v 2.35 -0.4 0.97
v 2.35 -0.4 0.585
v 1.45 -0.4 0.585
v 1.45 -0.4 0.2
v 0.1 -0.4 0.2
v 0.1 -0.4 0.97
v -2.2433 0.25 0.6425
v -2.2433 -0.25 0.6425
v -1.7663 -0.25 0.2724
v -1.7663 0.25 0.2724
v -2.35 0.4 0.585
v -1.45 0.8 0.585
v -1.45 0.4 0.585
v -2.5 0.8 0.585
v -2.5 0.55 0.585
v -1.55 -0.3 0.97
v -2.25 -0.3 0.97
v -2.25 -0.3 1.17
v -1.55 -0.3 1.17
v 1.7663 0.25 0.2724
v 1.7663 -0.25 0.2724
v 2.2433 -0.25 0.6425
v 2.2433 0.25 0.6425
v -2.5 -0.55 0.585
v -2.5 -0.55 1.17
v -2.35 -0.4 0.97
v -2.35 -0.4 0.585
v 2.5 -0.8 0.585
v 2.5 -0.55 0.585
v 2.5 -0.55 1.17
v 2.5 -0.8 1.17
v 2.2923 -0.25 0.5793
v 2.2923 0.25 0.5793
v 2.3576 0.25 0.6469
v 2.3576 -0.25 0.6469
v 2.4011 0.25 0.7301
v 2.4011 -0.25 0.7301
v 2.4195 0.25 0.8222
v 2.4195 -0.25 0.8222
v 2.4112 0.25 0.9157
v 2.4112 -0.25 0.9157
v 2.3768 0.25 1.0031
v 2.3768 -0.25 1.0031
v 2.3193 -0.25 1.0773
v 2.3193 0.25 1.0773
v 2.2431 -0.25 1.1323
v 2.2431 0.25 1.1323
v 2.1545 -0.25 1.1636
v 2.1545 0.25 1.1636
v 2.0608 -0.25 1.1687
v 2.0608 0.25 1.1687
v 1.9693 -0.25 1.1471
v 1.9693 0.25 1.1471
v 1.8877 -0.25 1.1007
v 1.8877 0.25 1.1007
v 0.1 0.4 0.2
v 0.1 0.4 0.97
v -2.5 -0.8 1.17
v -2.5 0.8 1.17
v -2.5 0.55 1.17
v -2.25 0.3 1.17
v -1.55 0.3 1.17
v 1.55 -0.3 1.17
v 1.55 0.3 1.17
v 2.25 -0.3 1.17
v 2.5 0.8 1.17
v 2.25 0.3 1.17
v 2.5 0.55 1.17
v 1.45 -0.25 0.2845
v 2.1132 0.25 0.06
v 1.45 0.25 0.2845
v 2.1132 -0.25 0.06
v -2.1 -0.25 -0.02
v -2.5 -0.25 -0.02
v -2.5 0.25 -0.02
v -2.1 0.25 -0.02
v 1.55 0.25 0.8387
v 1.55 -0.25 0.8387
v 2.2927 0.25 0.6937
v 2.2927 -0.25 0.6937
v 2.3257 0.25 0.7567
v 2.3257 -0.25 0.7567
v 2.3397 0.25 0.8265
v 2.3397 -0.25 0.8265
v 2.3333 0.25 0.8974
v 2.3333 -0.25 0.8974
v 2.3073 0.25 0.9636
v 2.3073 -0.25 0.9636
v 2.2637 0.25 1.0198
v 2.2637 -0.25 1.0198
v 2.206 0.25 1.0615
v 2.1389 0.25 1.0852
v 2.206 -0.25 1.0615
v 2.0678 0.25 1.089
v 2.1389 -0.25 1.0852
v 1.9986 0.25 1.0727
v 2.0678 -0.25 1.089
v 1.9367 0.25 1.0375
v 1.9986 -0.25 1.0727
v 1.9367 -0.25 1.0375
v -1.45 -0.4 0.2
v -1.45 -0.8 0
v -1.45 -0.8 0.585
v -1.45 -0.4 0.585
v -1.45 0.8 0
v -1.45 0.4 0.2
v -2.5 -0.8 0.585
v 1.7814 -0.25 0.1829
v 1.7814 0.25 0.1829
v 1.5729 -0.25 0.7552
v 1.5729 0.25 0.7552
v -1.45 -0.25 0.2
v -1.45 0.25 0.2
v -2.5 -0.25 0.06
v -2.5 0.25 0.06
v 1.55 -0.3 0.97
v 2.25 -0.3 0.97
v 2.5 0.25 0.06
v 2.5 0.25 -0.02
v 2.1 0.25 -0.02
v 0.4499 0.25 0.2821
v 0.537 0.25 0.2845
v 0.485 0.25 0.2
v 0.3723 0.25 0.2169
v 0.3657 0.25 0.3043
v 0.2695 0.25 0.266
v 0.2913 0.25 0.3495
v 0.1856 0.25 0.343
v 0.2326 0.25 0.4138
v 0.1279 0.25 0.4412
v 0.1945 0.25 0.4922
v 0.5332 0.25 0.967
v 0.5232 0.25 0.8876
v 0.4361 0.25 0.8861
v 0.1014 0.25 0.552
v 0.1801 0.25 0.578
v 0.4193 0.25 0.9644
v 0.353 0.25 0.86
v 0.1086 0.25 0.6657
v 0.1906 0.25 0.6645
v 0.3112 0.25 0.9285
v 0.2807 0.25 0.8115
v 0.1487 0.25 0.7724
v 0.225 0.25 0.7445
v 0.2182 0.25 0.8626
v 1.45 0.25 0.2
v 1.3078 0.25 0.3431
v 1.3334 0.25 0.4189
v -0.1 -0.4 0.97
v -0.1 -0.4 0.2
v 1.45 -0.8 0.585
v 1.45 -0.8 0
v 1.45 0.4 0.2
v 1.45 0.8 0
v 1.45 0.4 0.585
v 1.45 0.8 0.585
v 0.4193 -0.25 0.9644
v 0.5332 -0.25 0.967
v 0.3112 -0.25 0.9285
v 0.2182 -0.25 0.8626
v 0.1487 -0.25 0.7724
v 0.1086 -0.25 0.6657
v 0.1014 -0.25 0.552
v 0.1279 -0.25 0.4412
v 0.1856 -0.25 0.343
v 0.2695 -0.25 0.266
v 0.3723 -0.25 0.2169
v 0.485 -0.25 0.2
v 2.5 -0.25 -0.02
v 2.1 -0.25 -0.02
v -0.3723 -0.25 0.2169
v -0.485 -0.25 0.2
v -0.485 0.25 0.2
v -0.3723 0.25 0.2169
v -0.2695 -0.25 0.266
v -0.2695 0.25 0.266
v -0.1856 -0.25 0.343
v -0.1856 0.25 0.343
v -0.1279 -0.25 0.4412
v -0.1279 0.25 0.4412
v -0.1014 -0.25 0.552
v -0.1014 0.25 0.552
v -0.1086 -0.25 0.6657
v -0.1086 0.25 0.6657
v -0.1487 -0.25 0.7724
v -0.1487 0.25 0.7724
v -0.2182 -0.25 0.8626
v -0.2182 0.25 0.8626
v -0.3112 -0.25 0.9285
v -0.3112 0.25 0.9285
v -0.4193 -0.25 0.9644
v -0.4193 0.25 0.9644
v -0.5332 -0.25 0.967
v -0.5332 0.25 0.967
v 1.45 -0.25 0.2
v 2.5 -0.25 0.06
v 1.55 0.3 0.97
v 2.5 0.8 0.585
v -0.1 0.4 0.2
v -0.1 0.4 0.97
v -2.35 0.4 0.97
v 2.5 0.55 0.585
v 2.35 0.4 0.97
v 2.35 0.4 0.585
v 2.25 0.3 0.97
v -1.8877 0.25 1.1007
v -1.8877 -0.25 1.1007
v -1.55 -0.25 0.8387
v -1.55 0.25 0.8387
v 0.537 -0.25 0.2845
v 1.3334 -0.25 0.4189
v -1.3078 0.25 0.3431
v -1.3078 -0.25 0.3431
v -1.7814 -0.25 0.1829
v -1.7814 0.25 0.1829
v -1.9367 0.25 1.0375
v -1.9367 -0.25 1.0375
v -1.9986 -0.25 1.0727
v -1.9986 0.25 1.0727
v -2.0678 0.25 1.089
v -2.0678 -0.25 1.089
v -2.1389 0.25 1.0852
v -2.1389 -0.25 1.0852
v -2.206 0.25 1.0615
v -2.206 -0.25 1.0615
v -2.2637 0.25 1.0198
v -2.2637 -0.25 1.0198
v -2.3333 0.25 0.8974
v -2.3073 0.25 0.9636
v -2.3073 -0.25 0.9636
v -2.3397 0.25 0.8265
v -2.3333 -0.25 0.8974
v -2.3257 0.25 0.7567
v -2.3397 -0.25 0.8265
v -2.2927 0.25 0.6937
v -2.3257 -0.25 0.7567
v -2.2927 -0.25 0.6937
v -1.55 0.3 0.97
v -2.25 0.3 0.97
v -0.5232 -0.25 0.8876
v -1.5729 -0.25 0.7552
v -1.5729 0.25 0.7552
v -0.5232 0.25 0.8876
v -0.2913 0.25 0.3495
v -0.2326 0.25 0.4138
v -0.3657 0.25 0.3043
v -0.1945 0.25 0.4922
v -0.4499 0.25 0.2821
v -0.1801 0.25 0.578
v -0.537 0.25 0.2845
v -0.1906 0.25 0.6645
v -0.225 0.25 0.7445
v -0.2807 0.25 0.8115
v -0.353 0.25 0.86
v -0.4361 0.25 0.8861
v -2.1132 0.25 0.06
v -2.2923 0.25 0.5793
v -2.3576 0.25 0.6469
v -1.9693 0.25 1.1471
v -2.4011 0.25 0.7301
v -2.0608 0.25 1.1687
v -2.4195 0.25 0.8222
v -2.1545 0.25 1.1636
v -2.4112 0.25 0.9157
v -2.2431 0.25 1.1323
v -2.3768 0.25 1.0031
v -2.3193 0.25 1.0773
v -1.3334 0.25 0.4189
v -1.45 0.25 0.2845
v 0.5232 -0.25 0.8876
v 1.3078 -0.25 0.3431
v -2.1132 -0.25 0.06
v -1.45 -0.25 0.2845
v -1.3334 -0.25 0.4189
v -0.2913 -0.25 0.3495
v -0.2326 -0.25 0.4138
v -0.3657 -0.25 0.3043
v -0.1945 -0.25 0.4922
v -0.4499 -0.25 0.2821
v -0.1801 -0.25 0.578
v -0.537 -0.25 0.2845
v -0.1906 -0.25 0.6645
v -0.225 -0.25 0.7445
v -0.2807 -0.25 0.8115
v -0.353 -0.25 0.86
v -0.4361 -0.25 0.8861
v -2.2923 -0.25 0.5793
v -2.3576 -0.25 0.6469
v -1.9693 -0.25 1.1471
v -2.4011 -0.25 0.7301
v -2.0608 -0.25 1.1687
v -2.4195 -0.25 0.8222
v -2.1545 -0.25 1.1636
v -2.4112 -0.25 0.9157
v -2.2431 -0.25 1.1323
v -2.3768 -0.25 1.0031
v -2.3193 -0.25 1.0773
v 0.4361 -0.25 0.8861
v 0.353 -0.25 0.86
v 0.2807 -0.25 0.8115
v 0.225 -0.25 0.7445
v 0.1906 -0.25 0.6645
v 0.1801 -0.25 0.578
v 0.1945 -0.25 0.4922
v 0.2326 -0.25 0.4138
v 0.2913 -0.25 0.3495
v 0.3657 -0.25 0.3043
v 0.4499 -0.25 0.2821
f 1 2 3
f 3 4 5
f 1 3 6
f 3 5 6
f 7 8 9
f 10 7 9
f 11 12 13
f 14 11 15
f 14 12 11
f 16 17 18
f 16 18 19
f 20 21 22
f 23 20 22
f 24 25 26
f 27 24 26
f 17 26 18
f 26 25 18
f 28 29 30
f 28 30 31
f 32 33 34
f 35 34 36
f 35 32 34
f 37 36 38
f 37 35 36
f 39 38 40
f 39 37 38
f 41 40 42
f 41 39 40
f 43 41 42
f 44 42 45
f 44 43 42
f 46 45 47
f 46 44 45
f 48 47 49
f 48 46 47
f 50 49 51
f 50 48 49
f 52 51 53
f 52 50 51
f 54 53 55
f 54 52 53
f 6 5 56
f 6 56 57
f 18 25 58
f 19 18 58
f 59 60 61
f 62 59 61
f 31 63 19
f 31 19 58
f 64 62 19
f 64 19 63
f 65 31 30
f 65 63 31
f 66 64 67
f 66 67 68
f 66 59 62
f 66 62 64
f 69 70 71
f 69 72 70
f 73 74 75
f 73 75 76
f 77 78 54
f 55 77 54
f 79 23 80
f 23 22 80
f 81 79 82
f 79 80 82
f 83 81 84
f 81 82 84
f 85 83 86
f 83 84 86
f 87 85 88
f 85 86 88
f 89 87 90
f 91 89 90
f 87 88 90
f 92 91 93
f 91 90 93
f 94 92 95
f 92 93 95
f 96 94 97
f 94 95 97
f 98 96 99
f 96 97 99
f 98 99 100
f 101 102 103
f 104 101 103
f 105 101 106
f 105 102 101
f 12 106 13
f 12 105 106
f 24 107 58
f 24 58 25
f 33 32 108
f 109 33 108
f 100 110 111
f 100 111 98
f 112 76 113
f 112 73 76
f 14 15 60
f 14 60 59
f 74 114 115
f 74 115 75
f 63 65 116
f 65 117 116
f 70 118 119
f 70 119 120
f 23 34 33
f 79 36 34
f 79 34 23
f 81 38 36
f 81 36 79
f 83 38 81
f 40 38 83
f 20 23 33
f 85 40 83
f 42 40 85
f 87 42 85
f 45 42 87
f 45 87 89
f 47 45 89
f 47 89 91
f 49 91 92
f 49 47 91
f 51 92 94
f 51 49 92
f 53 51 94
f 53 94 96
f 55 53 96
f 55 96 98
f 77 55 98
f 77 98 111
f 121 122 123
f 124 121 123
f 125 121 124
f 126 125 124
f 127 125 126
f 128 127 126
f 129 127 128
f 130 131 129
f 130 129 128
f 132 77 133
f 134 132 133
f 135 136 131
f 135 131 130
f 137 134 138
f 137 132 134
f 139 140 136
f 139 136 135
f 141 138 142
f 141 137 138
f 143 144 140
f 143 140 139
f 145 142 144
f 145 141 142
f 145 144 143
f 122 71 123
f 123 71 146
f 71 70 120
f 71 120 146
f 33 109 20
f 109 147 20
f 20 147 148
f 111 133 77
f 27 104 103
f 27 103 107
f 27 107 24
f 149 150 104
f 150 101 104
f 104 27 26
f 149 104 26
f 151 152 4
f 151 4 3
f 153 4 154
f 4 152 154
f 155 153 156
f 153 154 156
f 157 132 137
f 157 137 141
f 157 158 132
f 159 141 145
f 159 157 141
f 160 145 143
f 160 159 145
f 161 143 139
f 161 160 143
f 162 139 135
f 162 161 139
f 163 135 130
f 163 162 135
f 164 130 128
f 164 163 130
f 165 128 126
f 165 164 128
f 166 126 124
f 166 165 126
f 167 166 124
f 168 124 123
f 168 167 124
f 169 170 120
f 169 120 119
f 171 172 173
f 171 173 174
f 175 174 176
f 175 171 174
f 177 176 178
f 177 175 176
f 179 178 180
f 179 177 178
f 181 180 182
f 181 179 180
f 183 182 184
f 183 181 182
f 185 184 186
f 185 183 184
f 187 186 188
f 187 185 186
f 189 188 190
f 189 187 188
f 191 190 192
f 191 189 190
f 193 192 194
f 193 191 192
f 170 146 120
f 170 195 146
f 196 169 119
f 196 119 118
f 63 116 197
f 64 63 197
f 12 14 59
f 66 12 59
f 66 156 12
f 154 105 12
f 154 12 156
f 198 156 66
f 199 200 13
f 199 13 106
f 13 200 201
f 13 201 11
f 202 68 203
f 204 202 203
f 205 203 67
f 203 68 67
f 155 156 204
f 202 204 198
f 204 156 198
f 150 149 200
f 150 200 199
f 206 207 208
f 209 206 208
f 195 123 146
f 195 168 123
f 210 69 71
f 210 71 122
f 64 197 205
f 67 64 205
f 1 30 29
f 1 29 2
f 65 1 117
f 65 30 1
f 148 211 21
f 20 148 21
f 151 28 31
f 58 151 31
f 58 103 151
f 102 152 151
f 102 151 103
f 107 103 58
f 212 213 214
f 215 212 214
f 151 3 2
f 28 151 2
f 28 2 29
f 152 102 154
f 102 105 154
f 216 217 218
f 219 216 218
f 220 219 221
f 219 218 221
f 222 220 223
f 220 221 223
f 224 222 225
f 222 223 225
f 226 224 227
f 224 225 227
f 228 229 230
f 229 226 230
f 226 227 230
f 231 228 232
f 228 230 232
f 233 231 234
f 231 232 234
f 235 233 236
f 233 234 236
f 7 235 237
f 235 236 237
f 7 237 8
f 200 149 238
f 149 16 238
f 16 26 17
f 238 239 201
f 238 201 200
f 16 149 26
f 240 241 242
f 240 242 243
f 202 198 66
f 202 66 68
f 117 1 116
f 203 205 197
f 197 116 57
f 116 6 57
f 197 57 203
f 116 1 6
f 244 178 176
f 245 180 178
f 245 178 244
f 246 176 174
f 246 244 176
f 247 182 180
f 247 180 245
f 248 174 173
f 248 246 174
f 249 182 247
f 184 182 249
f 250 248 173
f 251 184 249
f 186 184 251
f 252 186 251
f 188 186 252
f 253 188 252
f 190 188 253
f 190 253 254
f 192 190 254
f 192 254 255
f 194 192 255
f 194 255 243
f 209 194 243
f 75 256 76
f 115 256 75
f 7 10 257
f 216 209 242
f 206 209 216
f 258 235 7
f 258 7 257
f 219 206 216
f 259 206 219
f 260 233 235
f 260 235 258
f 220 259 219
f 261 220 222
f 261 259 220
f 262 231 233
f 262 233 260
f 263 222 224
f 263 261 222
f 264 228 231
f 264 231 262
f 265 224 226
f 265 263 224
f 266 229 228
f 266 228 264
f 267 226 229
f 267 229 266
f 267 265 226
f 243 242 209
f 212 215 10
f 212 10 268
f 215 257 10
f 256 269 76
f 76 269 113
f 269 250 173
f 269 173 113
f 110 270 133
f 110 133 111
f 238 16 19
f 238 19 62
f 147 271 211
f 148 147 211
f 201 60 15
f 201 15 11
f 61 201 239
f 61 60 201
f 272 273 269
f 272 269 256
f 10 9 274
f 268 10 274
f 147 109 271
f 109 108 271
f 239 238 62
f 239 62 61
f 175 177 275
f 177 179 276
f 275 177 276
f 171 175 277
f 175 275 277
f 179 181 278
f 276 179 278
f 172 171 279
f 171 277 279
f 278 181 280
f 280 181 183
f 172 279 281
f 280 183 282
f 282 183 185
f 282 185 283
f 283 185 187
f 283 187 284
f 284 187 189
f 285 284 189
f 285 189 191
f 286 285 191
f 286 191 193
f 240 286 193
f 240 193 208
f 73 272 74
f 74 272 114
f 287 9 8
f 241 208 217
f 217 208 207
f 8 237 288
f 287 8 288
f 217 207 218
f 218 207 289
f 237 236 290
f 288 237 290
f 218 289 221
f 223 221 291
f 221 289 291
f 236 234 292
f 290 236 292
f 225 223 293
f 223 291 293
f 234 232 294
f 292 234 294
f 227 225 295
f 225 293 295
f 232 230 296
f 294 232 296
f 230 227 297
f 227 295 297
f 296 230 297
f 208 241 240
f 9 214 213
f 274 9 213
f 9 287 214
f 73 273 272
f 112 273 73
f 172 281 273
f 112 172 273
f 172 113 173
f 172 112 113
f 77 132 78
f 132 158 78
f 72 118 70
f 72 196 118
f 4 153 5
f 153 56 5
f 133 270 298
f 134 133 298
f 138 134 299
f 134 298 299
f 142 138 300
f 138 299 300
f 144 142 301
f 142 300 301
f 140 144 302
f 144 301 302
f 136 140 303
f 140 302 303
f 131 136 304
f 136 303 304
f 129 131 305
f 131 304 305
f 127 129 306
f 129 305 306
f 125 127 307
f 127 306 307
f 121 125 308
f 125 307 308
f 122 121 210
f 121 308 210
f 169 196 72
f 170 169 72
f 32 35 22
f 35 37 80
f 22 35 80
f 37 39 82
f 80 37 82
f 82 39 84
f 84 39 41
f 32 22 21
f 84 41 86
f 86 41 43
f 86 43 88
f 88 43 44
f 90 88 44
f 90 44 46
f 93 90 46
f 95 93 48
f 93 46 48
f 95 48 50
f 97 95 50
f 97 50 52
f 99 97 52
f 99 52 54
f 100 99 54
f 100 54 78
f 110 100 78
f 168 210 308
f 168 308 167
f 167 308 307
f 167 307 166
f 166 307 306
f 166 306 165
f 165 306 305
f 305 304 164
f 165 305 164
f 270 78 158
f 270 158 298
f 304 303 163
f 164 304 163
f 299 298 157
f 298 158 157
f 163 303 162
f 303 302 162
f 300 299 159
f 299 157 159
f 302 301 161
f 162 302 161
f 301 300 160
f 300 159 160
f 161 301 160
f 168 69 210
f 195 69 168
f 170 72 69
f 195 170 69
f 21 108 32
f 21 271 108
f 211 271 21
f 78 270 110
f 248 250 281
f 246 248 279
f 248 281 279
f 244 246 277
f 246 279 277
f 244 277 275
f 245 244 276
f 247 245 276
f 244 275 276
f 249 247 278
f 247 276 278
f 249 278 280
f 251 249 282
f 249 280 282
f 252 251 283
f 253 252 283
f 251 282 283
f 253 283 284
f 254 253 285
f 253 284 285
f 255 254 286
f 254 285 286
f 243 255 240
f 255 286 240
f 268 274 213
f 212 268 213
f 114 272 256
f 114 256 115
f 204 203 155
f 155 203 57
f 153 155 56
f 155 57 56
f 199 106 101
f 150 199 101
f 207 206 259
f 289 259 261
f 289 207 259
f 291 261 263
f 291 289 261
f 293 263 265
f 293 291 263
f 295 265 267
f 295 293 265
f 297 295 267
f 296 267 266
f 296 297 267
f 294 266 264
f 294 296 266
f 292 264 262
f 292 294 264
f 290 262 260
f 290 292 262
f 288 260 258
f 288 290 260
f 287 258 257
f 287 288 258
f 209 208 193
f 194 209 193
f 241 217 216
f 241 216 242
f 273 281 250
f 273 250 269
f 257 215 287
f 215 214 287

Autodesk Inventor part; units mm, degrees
ref_plane "YZ Plane" through (0, 0, 0) normal (1, 0, 0) x (0, 1, 0)
ref_plane "XZ Plane" through (0, 0, 0) normal (0, 1, 0) x (-1, 0, 0)
ref_plane "XY Plane" through (0, 0, 0) normal (0, 0, 1) x (1, 0, 0)
sketch "Sketch1" plane through (0, 0, 0) normal (0, 0, 1) x (1, 0, 0)
  line L0 (2.5, -0.8) -> (-2.5, -0.8)
  line L1 (-2.5, -0.8) -> (-2.5, 0.8)
  line L2 (-2.5, 0.8) -> (2.5, 0.8)
  line L3 (2.5, 0.8) -> (2.5, -0.8)
  line L4 (2.5, -0.8) -> (-2.5, 0.8) construction
  line L5 (-2.5, -0.8) -> (2.5, 0.8) construction
  line L6 (-2.5, -0.3) -> (-1.55, -0.3)
  line L7 (-1.55, -0.3) -> (-1.55, 0.3)
  line L8 (-1.55, 0.3) -> (-2.5, 0.3)
  line L9 (-2.5, 0.3) -> (-2.5, -0.3)
  line L10 (0, -0.8) -> (0, 0.8)
  line L11 (2.5, -0.3) -> (1.55, -0.3)
  line L12 (1.55, -0.3) -> (1.55, 0.3)
  line L13 (1.55, 0.3) -> (2.5, 0.3)
  line L14 (2.5, 0.3) -> (2.5, -0.3)
  point P0 (0, 0)
  point P1 (-2.5, 0)
  point P2 (2.5, 0)
  dimension "d0" = 5
  dimension "d1" = 1.6
  dimension "d2" = 0.95
  dimension "d3" = 0.6
extrude "Extrusion1" add sketch "Sketch1" along normal blind 1.17 contours L0 L10 L2 L3 L13 L12 L11 | L0 L1 L6 L7 L8 L2 L10
sketch "Sketch2" plane through (-2.5, 0.8, 0) normal (0, 1, 0) x (1, 0, 0)
  line L0 (5, 0) -> (0, 0) projected
  line L1 (0, 0) -> (0, -1.17) projected
  line L2 (5, -1.17) -> (0, -1.17) projected
  line L3 (5, 0) -> (5, -1.17) projected
  line L4 (5, 0) -> (3.95, 0)
  line L5 (3.95, 0) -> (3.95, -0.585)
  line L6 (3.95, -0.585) -> (5, -0.585)
  line L7 (5, -0.585) -> (5, 0)
  line L8 (2.5, 0) -> (2.5, -1.17)
  line L9 (0, 0) -> (1.05, 0)
  line L10 (1.05, 0) -> (1.05, -0.585)
  line L11 (1.05, -0.585) -> (0, -0.585)
  line L12 (0, -0.585) -> (0, 0)
  dimension "d6" = 0.585
  dimension "d7" = 2.9
extrude "Extrusion2" cut sketch "Sketch2" against normal through all contours L3 L6 L5 L0 | L10 L11 L1 L0
sketch "Sketch3" plane through (1.45, 0.8, 0.585) normal (1, 0, 0) x (0, 0, -1)
  line L0 (0.585, -1.6) -> (0, -1.6) projected
  line L1 (0.585, 0) -> (0.585, -1.6) projected
  line L2 (0, 0) -> (0.585, 0) projected
  line L3 (0, 0) -> (0, -1.6) projected
  line L4 (0, -1.6) -> (0, -1.1) projected
  line L5 (0, -1.1) -> (-0.585, -1.1) projected
  line L6 (-0.585, -1.6) -> (-0.585, -1.1) projected
  line L7 (0, -1.6) -> (-0.585, -1.6) projected
  line L8 (0, -1.1) -> (0, -0.5) projected
  line L9 (0, -0.5) -> (-0.585, -0.5) projected
  line L10 (-0.585, -1.1) -> (-0.585, -0.5) projected
  line L11 (0, -1.1) -> (-0.585, -1.1) projected
  line L12 (0, -0.5) -> (0, 0) projected
  line L13 (0, 0) -> (-0.585, 0) projected
  line L14 (-0.585, -0.5) -> (-0.585, 0) projected
  line L15 (-0.585, -0.5) -> (0, -0.5) projected
  line L16 (0.385, -1.2) -> (-0.385, -1.2)
  line L17 (-0.385, -1.2) -> (-0.385, -0.4)
  line L18 (-0.385, -0.4) -> (0.385, -0.4)
  line L19 (0.385, -0.4) -> (0.385, -1.2)
  point P0 (0.585, -0.8)
  dimension "d10" = 0.4
  dimension "d11" = 0.4
  dimension "d12" = 0.2
  dimension "d13" = 0.2
extrude "Extrusion3" cut sketch "Sketch3" along normal through all both and the other way through all contours L16 L17 L5 L3 | L3 L18 L19 L16 | L5 L17 L9 L3 | L3 L9 L17 L18
sketch "Sketch4" plane through (0, 0, 0) normal (0, 1, 0) x (-1, 0, 0)
  line L0 (2.5, 0.97) -> (2.5, 0.585) projected
  line L1 (-2.5, 0.97) -> (2.5, 0.97) projected
  line L2 (-2.5, 0.585) -> (-2.5, 0.97) projected
  line L3 (-1.45, 0.585) -> (-2.5, 0.585) projected
  line L4 (-1.45, 0.2) -> (-1.45, 0.585) projected
  line L5 (1.45, 0.2) -> (-1.45, 0.2) projected
  line L6 (1.45, 0.585) -> (1.45, 0.2) projected
  line L7 (2.5, 0.585) -> (1.45, 0.585) projected
  line L8 (-0.1, 0.97) -> (0.1, 0.97)
  line L9 (0.1, 0.97) -> (0.1, 0.2)
  line L10 (0.1, 0.2) -> (-0.1, 0.2)
  line L11 (-0.1, 0.2) -> (-0.1, 0.97)
  point P0 (0, 0)
  point P1 (0, 0.97)
  dimension "d16" = 0.2
extrude "Extrusion4" add sketch "Sketch4" along normal mid plane 1.6 contours L9 L5 L11 L1
sketch "Sketch5" plane through (0, 0, 0) normal (0, 1, 0) x (-1, 0, 0)
  line L0 (-0.1, 0.2) -> (-0.1, 0.97) projected
  line L1 (-2.5, 0.97) -> (-0.1, 0.97) projected
  line L2 (-2.5, 0.585) -> (-2.5, 0.97) projected
  line L3 (-1.45, 0.585) -> (-2.5, 0.585) projected
  line L4 (-1.45, 0.2) -> (-1.45, 0.585) projected
  line L5 (-0.1, 0.2) -> (-1.45, 0.2) projected
  line L6 (-0.1, 0.2) -> (-1.45, 0.2) projected
  arc A0 (-0.485, 0.2) -> (-0.5332, 0.967) centre (-0.485, 0.585) ccw
  arc A1 (-0.537, 0.2845) -> (-0.5232, 0.8876) centre (-0.485, 0.585) ccw
  line L7 (-0.485, 0.2) -> (-1.45, 0.2)
  line L8 (-1.45, 0.2) -> (-2.1, -0.02)
  line L9 (-2.1, -0.02) -> (-2.5, -0.02)
  line L10 (-2.5, -0.02) -> (-2.5, 0.06)
  line L11 (-2.5, 0.06) -> (-2.1132, 0.06)
  line L12 (-2.1132, 0.06) -> (-1.45, 0.2845)
  line L13 (-1.45, 0.2845) -> (-0.537, 0.2845)
  line L14 (1.45, 0) -> (-1.45, 0) projected
  line L15 (-0.5332, 0.967) -> (-1.55, 0.8387)
  line L16 (-1.55, 0.8387) -> (-1.8877, 1.1007)
  line L17 (-0.5232, 0.8876) -> (-1.5729, 0.7552)
  line L18 (-1.5729, 0.7552) -> (-1.9367, 1.0375)
  arc A2 (-1.8877, 1.1007) -> (-2.2923, 0.5793) centre (-2.09, 0.84) ccw
  arc A3 (-1.9367, 1.0375) -> (-2.2433, 0.6425) centre (-2.09, 0.84) ccw
  line L19 (2.5, 1.17) -> (-2.5, 1.17) projected
  line L20 (-1.55, 0.97) -> (-1.55, 1.17) projected
  line L21 (-2.2923, 0.5793) -> (-1.7814, 0.1829)
  line L22 (-1.7814, 0.1829) -> (-1.3078, 0.3431)
  line L23 (-1.3078, 0.3431) -> (-1.3334, 0.4189)
  line L24 (-1.3334, 0.4189) -> (-1.7663, 0.2724)
  line L25 (-1.7663, 0.2724) -> (-2.2433, 0.6425)
  line L26 (-2.2923, 0.5793) -> (-2.2879, 0.585)
  line L27 (-0.1, 0.97) -> (-0.2128, 0.8572)
  point P0 (0, 0)
  point P1 (0, 1.17)
  dimension "d20" = 0.08
  dimension "d21" = 0.08
  dimension "d22" = 0.08
  dimension "d23" = 0.02
  dimension "d25" = 0.4
  dimension "d26" = 0.08
  dimension "d27" = 0.5
  dimension "d29" = 2.09
  dimension "d30" = 135
  dimension "d31" = 0
  dimension "d32" = 0.08
  dimension "d33" = 0.01
  dimension "d34" = 0.5
extrude "Extrusion5" add sketch "Sketch5" along normal mid plane 0.5 separate body contours A0 L5 L4 L13 A1 L17 L18 L1 L16 L15 | L8 L9 L10 L11 L12 L4 | L22 L21 L26 L3 L25 L24 L4 | L4 L24 L23 L22 | L1 L18 A3 A2 L16 | A2 L3 L26 | A3 L25 L3 A2 L1
mirror "Mirror1" about plane through (0, 0, 0) normal (1, 0, 0) of "Extrusion5" bodies 2
sketch "Sketch6" plane through (0, 0, 1.17) normal (0, 0, 1) x (1, 0, 0)
  line L0 (2.5, -0.3) -> (1.55, -0.3) projected
  line L1 (1.55, -0.3) -> (1.55, 0.3) projected
  line L2 (1.55, 0.3) -> (2.5, 0.3) projected
  line L3 (2.5, 0.3) -> (2.5, 0.8) projected
  line L4 (2.5, 0.8) -> (-2.5, 0.8) projected
  line L5 (-2.5, 0.8) -> (-2.5, 0.3) projected
  line L6 (-2.5, 0.3) -> (-1.55, 0.3) projected
  line L7 (-1.55, 0.3) -> (-1.55, -0.3) projected
  line L8 (-1.55, -0.3) -> (-2.5, -0.3) projected
  line L9 (-2.5, -0.3) -> (-2.5, -0.8) projected
  line L10 (-2.5, -0.8) -> (2.5, -0.8) projected
  line L11 (2.5, -0.8) -> (2.5, -0.3) projected
  line L12 (2.5, -0.55) -> (2.25, -0.3)
  line L13 (2.5, -0.3) -> (1.55, -0.3) projected
  line L14 (2.5, 0.55) -> (2.25, 0.3)
  line L15 (-2.5, -0.3) -> (-2.5, -0.8) projected
  line L16 (-2.5, -0.55) -> (-2.25, -0.3)
  line L17 (-1.55, -0.3) -> (-2.5, -0.3) projected
  line L18 (-2.5, 0.8) -> (-2.5, 0.3) projected
  line L19 (-2.5, 0.55) -> (-2.25, 0.3)
  line L20 (-2.5, 0.3) -> (-1.55, 0.3) projected
  point P0 (0, 0)
  dimension "d37" = 45
extrude "Extrusion6" cut sketch "Sketch6" against normal through all contours L11 L12 L0 | L14 L3 L2 | L9 L8 L16 | L19 L6 L5 bodies 1
properties part number "788640001" material "ABS Plastic"
